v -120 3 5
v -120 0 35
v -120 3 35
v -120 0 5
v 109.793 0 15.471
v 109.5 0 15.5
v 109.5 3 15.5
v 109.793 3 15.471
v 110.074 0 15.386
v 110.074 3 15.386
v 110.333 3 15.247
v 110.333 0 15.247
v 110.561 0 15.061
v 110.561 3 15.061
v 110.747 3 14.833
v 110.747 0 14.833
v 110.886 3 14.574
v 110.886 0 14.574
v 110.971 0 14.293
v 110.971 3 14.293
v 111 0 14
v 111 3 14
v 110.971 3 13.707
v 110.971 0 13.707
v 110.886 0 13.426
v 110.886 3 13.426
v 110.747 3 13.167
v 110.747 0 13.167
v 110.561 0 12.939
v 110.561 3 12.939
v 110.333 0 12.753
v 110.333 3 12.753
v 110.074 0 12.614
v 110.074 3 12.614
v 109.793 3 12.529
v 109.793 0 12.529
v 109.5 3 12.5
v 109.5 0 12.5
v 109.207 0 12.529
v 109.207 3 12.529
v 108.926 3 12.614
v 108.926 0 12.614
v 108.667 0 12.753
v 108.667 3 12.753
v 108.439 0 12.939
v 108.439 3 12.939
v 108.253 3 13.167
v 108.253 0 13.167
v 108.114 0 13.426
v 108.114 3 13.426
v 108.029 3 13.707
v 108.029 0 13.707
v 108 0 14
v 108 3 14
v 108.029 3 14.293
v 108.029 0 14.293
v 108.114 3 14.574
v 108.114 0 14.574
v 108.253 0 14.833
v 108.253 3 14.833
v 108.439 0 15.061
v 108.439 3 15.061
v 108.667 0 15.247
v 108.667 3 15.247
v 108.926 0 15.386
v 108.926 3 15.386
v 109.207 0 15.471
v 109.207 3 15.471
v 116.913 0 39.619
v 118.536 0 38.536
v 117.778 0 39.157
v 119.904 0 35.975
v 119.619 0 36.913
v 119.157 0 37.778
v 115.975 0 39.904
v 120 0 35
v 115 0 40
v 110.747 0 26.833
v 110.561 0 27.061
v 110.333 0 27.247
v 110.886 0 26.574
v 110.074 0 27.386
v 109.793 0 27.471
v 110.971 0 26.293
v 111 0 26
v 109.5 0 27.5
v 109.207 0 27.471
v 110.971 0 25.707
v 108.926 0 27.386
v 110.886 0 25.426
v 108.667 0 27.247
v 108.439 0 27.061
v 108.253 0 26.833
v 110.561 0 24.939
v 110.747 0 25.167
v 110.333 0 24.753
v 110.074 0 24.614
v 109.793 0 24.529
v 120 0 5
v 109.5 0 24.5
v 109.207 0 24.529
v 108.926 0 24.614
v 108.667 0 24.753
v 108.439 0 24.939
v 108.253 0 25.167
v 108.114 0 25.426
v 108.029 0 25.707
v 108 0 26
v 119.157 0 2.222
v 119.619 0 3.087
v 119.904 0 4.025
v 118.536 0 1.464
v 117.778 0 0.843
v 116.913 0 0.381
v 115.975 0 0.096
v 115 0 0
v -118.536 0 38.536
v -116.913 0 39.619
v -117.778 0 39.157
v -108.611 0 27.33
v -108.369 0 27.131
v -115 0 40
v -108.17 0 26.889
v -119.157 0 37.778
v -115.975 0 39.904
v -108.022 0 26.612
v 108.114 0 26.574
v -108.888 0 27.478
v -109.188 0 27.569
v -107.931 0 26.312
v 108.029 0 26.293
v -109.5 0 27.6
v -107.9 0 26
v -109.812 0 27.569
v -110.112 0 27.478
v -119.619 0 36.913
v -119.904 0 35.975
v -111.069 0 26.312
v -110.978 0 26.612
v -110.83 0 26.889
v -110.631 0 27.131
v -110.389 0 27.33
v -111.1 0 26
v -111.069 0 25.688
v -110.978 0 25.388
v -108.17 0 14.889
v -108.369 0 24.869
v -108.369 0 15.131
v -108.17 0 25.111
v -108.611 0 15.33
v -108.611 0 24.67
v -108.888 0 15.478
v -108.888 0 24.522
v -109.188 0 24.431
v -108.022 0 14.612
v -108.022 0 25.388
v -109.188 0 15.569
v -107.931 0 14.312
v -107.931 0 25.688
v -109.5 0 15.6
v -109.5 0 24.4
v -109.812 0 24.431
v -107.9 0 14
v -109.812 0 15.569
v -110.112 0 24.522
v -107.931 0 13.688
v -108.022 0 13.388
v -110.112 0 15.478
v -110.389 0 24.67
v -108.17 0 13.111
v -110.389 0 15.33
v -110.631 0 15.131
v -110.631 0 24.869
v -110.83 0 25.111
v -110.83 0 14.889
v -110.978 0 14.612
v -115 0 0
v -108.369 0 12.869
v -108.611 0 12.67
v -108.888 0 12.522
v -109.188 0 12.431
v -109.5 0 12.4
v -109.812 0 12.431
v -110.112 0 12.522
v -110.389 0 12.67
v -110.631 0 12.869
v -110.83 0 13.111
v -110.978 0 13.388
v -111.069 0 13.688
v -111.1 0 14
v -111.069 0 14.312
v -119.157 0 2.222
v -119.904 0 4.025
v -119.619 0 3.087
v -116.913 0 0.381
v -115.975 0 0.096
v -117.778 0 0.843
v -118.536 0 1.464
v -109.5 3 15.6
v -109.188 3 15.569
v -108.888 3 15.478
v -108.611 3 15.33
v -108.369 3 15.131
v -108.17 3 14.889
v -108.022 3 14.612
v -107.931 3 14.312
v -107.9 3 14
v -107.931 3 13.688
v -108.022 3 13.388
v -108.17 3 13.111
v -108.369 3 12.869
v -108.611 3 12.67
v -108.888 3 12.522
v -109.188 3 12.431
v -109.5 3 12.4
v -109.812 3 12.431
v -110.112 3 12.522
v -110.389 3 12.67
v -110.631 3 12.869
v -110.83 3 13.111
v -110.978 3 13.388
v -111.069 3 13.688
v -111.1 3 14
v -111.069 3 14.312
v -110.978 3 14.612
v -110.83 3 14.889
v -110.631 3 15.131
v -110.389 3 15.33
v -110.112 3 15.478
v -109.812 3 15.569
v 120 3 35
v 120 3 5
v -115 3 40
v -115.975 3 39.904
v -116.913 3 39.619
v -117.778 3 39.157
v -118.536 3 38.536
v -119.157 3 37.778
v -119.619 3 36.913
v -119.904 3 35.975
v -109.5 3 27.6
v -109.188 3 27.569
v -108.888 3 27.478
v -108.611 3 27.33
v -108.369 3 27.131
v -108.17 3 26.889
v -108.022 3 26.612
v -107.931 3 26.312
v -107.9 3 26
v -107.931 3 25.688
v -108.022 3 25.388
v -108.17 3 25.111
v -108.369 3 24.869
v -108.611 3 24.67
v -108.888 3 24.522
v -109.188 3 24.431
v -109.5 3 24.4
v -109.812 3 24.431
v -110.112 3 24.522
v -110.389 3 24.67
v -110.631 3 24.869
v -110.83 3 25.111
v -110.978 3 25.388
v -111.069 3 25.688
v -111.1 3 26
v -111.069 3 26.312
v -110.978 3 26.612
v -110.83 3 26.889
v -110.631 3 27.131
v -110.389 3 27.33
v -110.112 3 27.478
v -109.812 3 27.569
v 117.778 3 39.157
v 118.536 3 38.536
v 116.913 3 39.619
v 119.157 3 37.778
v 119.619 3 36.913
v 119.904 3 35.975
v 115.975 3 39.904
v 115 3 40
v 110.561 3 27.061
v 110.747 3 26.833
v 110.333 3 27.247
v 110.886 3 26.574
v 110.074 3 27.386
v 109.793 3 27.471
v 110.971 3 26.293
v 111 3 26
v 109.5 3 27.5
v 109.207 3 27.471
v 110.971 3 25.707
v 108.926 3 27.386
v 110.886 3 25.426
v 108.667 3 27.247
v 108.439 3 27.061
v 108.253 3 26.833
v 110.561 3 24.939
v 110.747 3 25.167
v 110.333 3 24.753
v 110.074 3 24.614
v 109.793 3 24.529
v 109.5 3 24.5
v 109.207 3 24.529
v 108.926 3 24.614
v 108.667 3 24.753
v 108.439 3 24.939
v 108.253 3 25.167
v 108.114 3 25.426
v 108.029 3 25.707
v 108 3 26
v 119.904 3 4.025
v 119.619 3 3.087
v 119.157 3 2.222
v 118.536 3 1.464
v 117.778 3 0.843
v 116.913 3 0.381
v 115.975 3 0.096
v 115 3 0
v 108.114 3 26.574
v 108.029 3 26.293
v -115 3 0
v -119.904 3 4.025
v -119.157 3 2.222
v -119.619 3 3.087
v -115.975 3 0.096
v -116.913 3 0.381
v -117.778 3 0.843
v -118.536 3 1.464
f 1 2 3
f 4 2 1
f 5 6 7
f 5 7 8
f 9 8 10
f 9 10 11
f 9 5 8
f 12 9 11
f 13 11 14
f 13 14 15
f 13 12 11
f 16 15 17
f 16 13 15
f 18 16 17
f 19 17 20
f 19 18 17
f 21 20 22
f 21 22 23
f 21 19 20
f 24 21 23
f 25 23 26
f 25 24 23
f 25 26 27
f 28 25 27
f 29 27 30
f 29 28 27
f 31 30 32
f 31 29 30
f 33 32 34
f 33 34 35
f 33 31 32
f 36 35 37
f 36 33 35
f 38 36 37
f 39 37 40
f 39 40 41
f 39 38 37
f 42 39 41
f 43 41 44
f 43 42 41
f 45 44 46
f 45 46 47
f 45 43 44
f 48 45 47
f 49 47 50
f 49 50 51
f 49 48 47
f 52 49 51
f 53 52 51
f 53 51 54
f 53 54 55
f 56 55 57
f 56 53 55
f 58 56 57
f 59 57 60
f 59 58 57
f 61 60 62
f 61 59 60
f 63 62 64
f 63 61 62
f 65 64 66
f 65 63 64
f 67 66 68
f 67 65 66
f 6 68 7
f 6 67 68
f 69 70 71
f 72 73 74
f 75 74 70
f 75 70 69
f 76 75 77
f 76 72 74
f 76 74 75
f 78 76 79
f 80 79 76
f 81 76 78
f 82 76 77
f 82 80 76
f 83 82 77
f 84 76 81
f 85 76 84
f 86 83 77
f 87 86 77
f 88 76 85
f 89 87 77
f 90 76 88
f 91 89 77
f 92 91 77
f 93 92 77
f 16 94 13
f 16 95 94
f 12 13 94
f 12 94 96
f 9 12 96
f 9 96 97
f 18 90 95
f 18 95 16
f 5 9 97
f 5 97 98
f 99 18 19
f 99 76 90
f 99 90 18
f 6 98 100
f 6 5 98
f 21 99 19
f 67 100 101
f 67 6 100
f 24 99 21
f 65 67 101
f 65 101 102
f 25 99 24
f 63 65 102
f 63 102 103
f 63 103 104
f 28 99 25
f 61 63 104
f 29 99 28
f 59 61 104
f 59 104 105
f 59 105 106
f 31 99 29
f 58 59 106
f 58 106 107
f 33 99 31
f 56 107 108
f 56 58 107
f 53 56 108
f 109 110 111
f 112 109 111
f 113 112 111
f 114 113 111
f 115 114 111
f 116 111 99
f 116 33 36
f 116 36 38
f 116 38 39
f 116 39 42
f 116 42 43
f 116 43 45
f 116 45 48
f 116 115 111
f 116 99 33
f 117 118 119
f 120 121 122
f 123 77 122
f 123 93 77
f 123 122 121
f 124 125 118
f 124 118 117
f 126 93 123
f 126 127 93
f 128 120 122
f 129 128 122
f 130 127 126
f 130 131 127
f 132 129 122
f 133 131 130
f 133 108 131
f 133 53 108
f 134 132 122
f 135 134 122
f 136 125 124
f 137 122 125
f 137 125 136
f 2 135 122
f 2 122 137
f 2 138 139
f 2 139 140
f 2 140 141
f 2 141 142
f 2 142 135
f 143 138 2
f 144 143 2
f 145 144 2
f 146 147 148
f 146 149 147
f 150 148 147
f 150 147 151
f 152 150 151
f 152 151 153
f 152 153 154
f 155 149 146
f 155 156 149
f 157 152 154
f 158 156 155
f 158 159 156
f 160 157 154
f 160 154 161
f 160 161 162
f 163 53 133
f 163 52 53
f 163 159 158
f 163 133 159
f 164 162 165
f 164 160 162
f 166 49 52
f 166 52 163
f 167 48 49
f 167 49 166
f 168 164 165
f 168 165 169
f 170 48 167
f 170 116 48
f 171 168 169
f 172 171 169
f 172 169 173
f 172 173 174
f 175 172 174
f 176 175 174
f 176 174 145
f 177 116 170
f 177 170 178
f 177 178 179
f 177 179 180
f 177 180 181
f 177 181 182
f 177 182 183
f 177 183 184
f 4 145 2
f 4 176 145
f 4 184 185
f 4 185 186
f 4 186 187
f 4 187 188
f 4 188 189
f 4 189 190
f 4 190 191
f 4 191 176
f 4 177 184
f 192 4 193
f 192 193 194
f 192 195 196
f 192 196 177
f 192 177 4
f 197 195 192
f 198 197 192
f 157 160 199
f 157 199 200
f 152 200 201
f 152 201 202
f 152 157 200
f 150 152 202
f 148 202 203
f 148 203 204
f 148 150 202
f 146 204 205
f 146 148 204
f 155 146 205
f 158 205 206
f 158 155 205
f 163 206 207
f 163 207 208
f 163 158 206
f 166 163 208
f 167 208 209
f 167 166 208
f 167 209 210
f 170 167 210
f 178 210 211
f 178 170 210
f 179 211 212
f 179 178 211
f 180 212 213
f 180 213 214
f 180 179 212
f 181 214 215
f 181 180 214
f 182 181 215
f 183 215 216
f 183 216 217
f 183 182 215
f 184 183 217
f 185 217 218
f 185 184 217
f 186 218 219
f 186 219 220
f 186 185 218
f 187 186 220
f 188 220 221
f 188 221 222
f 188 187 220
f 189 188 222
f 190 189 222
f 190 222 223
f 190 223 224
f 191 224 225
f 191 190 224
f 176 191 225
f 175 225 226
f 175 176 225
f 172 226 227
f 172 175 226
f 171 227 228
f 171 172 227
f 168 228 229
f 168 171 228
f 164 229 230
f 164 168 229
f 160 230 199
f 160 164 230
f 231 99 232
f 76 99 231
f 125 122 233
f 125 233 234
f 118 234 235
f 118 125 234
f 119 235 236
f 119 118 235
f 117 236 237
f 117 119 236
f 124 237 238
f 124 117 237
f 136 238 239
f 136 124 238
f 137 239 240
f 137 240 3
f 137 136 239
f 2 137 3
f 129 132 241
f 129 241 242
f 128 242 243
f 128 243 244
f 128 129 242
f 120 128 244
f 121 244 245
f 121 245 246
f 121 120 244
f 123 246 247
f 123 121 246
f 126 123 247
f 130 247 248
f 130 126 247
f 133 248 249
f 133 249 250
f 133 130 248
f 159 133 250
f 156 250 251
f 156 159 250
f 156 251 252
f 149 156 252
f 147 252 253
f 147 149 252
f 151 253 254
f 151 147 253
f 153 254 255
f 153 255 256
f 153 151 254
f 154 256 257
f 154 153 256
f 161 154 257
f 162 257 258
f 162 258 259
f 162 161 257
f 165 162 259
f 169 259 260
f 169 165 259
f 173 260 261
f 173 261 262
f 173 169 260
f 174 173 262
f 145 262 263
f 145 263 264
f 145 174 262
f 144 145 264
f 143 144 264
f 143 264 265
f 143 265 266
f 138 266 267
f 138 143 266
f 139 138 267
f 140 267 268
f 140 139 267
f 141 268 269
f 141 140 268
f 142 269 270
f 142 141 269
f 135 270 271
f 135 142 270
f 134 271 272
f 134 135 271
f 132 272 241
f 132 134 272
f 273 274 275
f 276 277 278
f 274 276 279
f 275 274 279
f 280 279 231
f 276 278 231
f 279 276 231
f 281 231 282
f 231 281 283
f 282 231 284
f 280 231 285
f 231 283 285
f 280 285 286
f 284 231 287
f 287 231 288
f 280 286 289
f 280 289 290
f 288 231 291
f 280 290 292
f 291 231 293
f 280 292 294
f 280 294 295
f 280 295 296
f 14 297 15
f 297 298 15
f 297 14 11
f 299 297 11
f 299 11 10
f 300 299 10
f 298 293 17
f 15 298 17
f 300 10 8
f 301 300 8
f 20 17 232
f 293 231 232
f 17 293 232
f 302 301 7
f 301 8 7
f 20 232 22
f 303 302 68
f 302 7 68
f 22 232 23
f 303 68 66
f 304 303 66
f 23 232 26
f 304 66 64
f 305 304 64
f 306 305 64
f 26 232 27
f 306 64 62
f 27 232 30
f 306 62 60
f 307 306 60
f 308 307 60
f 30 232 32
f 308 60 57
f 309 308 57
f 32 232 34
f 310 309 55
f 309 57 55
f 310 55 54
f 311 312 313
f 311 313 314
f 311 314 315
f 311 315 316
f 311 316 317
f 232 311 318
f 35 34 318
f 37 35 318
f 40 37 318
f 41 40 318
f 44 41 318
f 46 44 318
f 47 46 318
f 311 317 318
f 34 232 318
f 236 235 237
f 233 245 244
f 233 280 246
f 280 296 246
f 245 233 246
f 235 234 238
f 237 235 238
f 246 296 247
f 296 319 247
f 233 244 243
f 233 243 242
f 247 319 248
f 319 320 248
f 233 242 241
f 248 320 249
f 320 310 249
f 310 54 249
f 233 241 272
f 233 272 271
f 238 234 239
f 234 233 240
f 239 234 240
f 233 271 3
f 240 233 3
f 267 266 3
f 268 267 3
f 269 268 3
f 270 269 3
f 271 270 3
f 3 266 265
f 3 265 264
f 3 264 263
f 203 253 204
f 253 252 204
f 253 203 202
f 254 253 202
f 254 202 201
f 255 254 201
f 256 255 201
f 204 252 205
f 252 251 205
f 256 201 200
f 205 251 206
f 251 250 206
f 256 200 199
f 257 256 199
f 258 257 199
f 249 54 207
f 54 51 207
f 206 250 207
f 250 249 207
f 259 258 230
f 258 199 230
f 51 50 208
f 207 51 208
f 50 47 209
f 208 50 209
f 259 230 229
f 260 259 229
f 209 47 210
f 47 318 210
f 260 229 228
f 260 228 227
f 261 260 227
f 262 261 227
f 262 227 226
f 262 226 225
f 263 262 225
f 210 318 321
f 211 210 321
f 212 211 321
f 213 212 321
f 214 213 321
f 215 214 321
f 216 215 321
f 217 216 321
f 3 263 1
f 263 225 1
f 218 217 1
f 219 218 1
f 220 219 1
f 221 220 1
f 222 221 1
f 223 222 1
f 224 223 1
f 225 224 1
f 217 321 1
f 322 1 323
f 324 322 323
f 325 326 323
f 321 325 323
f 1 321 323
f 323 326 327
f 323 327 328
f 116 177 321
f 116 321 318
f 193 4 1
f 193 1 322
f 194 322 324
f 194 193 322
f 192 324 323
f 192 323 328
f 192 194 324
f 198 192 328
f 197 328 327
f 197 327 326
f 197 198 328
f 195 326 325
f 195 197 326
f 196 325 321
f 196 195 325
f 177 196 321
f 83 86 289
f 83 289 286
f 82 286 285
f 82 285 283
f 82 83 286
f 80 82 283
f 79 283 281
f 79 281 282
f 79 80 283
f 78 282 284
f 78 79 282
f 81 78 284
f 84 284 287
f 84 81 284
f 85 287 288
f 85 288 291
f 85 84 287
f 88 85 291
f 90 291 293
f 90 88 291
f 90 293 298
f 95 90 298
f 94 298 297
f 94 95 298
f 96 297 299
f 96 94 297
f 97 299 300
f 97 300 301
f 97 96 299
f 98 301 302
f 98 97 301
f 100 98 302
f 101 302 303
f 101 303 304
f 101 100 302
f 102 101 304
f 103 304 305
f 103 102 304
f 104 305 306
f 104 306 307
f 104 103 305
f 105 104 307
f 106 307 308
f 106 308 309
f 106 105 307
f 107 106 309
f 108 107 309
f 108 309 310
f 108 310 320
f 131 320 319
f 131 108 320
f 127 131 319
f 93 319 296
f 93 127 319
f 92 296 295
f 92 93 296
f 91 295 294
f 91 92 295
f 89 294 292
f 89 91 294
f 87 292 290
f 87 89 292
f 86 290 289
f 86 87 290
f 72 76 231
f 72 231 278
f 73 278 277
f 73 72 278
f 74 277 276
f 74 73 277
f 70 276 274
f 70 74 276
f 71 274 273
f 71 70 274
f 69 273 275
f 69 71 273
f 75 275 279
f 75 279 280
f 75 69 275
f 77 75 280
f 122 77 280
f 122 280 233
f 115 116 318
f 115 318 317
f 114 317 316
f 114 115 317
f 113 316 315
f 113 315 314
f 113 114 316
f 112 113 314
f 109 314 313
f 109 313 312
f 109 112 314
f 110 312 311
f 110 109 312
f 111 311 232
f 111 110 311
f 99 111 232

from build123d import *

# Parameters (mm, degrees)
SKETCH_1_R      = 1.6
SKETCH_1_R_2    = 1.5
EXTRUDE_1_DEPTH = 3


with BuildPart() as part:
    # 草图1 → 凸台-拉伸1 (new body)
    with BuildSketch(Plane(origin=(0, 0, 0), x_dir=(1, 0, 0), z_dir=(0, 1, 0))):
        with BuildLine():
            Line((-115, 0), (115, 0))
            ThreePointArc((115, 0), (118.535533906, -1.464466094), (120, -5))
            Line((120, -5), (120, -35))
            ThreePointArc((120, -35), (118.535533906, -38.535533906), (115, -40))
            Line((115, -40), (-115, -40))
            ThreePointArc((-115, -40), (-118.535533906, -38.535533906), (-120, -35))
            Line((-120, -35), (-120, -5))
            ThreePointArc((-120, -5), (-118.535533906, -1.464466094), (-115, 0))
        make_face()
        with Locations(Location((-109.5, -26, 0), (0, 0, 270))):
            Circle(SKETCH_1_R, mode=Mode.SUBTRACT)
        with Locations(Location((109.5, -14, 0), (0, 0, 270))):
            Circle(SKETCH_1_R_2, mode=Mode.SUBTRACT)
        with Locations(Location((109.5, -26, 0), (0, 0, 270))):
            Circle(SKETCH_1_R_2, mode=Mode.SUBTRACT)
        with Locations(Location((-109.5, -14, 0), (0, 0, 270))):
            Circle(SKETCH_1_R, mode=Mode.SUBTRACT)
    extrude(amount=EXTRUDE_1_DEPTH)


solid = part.part
